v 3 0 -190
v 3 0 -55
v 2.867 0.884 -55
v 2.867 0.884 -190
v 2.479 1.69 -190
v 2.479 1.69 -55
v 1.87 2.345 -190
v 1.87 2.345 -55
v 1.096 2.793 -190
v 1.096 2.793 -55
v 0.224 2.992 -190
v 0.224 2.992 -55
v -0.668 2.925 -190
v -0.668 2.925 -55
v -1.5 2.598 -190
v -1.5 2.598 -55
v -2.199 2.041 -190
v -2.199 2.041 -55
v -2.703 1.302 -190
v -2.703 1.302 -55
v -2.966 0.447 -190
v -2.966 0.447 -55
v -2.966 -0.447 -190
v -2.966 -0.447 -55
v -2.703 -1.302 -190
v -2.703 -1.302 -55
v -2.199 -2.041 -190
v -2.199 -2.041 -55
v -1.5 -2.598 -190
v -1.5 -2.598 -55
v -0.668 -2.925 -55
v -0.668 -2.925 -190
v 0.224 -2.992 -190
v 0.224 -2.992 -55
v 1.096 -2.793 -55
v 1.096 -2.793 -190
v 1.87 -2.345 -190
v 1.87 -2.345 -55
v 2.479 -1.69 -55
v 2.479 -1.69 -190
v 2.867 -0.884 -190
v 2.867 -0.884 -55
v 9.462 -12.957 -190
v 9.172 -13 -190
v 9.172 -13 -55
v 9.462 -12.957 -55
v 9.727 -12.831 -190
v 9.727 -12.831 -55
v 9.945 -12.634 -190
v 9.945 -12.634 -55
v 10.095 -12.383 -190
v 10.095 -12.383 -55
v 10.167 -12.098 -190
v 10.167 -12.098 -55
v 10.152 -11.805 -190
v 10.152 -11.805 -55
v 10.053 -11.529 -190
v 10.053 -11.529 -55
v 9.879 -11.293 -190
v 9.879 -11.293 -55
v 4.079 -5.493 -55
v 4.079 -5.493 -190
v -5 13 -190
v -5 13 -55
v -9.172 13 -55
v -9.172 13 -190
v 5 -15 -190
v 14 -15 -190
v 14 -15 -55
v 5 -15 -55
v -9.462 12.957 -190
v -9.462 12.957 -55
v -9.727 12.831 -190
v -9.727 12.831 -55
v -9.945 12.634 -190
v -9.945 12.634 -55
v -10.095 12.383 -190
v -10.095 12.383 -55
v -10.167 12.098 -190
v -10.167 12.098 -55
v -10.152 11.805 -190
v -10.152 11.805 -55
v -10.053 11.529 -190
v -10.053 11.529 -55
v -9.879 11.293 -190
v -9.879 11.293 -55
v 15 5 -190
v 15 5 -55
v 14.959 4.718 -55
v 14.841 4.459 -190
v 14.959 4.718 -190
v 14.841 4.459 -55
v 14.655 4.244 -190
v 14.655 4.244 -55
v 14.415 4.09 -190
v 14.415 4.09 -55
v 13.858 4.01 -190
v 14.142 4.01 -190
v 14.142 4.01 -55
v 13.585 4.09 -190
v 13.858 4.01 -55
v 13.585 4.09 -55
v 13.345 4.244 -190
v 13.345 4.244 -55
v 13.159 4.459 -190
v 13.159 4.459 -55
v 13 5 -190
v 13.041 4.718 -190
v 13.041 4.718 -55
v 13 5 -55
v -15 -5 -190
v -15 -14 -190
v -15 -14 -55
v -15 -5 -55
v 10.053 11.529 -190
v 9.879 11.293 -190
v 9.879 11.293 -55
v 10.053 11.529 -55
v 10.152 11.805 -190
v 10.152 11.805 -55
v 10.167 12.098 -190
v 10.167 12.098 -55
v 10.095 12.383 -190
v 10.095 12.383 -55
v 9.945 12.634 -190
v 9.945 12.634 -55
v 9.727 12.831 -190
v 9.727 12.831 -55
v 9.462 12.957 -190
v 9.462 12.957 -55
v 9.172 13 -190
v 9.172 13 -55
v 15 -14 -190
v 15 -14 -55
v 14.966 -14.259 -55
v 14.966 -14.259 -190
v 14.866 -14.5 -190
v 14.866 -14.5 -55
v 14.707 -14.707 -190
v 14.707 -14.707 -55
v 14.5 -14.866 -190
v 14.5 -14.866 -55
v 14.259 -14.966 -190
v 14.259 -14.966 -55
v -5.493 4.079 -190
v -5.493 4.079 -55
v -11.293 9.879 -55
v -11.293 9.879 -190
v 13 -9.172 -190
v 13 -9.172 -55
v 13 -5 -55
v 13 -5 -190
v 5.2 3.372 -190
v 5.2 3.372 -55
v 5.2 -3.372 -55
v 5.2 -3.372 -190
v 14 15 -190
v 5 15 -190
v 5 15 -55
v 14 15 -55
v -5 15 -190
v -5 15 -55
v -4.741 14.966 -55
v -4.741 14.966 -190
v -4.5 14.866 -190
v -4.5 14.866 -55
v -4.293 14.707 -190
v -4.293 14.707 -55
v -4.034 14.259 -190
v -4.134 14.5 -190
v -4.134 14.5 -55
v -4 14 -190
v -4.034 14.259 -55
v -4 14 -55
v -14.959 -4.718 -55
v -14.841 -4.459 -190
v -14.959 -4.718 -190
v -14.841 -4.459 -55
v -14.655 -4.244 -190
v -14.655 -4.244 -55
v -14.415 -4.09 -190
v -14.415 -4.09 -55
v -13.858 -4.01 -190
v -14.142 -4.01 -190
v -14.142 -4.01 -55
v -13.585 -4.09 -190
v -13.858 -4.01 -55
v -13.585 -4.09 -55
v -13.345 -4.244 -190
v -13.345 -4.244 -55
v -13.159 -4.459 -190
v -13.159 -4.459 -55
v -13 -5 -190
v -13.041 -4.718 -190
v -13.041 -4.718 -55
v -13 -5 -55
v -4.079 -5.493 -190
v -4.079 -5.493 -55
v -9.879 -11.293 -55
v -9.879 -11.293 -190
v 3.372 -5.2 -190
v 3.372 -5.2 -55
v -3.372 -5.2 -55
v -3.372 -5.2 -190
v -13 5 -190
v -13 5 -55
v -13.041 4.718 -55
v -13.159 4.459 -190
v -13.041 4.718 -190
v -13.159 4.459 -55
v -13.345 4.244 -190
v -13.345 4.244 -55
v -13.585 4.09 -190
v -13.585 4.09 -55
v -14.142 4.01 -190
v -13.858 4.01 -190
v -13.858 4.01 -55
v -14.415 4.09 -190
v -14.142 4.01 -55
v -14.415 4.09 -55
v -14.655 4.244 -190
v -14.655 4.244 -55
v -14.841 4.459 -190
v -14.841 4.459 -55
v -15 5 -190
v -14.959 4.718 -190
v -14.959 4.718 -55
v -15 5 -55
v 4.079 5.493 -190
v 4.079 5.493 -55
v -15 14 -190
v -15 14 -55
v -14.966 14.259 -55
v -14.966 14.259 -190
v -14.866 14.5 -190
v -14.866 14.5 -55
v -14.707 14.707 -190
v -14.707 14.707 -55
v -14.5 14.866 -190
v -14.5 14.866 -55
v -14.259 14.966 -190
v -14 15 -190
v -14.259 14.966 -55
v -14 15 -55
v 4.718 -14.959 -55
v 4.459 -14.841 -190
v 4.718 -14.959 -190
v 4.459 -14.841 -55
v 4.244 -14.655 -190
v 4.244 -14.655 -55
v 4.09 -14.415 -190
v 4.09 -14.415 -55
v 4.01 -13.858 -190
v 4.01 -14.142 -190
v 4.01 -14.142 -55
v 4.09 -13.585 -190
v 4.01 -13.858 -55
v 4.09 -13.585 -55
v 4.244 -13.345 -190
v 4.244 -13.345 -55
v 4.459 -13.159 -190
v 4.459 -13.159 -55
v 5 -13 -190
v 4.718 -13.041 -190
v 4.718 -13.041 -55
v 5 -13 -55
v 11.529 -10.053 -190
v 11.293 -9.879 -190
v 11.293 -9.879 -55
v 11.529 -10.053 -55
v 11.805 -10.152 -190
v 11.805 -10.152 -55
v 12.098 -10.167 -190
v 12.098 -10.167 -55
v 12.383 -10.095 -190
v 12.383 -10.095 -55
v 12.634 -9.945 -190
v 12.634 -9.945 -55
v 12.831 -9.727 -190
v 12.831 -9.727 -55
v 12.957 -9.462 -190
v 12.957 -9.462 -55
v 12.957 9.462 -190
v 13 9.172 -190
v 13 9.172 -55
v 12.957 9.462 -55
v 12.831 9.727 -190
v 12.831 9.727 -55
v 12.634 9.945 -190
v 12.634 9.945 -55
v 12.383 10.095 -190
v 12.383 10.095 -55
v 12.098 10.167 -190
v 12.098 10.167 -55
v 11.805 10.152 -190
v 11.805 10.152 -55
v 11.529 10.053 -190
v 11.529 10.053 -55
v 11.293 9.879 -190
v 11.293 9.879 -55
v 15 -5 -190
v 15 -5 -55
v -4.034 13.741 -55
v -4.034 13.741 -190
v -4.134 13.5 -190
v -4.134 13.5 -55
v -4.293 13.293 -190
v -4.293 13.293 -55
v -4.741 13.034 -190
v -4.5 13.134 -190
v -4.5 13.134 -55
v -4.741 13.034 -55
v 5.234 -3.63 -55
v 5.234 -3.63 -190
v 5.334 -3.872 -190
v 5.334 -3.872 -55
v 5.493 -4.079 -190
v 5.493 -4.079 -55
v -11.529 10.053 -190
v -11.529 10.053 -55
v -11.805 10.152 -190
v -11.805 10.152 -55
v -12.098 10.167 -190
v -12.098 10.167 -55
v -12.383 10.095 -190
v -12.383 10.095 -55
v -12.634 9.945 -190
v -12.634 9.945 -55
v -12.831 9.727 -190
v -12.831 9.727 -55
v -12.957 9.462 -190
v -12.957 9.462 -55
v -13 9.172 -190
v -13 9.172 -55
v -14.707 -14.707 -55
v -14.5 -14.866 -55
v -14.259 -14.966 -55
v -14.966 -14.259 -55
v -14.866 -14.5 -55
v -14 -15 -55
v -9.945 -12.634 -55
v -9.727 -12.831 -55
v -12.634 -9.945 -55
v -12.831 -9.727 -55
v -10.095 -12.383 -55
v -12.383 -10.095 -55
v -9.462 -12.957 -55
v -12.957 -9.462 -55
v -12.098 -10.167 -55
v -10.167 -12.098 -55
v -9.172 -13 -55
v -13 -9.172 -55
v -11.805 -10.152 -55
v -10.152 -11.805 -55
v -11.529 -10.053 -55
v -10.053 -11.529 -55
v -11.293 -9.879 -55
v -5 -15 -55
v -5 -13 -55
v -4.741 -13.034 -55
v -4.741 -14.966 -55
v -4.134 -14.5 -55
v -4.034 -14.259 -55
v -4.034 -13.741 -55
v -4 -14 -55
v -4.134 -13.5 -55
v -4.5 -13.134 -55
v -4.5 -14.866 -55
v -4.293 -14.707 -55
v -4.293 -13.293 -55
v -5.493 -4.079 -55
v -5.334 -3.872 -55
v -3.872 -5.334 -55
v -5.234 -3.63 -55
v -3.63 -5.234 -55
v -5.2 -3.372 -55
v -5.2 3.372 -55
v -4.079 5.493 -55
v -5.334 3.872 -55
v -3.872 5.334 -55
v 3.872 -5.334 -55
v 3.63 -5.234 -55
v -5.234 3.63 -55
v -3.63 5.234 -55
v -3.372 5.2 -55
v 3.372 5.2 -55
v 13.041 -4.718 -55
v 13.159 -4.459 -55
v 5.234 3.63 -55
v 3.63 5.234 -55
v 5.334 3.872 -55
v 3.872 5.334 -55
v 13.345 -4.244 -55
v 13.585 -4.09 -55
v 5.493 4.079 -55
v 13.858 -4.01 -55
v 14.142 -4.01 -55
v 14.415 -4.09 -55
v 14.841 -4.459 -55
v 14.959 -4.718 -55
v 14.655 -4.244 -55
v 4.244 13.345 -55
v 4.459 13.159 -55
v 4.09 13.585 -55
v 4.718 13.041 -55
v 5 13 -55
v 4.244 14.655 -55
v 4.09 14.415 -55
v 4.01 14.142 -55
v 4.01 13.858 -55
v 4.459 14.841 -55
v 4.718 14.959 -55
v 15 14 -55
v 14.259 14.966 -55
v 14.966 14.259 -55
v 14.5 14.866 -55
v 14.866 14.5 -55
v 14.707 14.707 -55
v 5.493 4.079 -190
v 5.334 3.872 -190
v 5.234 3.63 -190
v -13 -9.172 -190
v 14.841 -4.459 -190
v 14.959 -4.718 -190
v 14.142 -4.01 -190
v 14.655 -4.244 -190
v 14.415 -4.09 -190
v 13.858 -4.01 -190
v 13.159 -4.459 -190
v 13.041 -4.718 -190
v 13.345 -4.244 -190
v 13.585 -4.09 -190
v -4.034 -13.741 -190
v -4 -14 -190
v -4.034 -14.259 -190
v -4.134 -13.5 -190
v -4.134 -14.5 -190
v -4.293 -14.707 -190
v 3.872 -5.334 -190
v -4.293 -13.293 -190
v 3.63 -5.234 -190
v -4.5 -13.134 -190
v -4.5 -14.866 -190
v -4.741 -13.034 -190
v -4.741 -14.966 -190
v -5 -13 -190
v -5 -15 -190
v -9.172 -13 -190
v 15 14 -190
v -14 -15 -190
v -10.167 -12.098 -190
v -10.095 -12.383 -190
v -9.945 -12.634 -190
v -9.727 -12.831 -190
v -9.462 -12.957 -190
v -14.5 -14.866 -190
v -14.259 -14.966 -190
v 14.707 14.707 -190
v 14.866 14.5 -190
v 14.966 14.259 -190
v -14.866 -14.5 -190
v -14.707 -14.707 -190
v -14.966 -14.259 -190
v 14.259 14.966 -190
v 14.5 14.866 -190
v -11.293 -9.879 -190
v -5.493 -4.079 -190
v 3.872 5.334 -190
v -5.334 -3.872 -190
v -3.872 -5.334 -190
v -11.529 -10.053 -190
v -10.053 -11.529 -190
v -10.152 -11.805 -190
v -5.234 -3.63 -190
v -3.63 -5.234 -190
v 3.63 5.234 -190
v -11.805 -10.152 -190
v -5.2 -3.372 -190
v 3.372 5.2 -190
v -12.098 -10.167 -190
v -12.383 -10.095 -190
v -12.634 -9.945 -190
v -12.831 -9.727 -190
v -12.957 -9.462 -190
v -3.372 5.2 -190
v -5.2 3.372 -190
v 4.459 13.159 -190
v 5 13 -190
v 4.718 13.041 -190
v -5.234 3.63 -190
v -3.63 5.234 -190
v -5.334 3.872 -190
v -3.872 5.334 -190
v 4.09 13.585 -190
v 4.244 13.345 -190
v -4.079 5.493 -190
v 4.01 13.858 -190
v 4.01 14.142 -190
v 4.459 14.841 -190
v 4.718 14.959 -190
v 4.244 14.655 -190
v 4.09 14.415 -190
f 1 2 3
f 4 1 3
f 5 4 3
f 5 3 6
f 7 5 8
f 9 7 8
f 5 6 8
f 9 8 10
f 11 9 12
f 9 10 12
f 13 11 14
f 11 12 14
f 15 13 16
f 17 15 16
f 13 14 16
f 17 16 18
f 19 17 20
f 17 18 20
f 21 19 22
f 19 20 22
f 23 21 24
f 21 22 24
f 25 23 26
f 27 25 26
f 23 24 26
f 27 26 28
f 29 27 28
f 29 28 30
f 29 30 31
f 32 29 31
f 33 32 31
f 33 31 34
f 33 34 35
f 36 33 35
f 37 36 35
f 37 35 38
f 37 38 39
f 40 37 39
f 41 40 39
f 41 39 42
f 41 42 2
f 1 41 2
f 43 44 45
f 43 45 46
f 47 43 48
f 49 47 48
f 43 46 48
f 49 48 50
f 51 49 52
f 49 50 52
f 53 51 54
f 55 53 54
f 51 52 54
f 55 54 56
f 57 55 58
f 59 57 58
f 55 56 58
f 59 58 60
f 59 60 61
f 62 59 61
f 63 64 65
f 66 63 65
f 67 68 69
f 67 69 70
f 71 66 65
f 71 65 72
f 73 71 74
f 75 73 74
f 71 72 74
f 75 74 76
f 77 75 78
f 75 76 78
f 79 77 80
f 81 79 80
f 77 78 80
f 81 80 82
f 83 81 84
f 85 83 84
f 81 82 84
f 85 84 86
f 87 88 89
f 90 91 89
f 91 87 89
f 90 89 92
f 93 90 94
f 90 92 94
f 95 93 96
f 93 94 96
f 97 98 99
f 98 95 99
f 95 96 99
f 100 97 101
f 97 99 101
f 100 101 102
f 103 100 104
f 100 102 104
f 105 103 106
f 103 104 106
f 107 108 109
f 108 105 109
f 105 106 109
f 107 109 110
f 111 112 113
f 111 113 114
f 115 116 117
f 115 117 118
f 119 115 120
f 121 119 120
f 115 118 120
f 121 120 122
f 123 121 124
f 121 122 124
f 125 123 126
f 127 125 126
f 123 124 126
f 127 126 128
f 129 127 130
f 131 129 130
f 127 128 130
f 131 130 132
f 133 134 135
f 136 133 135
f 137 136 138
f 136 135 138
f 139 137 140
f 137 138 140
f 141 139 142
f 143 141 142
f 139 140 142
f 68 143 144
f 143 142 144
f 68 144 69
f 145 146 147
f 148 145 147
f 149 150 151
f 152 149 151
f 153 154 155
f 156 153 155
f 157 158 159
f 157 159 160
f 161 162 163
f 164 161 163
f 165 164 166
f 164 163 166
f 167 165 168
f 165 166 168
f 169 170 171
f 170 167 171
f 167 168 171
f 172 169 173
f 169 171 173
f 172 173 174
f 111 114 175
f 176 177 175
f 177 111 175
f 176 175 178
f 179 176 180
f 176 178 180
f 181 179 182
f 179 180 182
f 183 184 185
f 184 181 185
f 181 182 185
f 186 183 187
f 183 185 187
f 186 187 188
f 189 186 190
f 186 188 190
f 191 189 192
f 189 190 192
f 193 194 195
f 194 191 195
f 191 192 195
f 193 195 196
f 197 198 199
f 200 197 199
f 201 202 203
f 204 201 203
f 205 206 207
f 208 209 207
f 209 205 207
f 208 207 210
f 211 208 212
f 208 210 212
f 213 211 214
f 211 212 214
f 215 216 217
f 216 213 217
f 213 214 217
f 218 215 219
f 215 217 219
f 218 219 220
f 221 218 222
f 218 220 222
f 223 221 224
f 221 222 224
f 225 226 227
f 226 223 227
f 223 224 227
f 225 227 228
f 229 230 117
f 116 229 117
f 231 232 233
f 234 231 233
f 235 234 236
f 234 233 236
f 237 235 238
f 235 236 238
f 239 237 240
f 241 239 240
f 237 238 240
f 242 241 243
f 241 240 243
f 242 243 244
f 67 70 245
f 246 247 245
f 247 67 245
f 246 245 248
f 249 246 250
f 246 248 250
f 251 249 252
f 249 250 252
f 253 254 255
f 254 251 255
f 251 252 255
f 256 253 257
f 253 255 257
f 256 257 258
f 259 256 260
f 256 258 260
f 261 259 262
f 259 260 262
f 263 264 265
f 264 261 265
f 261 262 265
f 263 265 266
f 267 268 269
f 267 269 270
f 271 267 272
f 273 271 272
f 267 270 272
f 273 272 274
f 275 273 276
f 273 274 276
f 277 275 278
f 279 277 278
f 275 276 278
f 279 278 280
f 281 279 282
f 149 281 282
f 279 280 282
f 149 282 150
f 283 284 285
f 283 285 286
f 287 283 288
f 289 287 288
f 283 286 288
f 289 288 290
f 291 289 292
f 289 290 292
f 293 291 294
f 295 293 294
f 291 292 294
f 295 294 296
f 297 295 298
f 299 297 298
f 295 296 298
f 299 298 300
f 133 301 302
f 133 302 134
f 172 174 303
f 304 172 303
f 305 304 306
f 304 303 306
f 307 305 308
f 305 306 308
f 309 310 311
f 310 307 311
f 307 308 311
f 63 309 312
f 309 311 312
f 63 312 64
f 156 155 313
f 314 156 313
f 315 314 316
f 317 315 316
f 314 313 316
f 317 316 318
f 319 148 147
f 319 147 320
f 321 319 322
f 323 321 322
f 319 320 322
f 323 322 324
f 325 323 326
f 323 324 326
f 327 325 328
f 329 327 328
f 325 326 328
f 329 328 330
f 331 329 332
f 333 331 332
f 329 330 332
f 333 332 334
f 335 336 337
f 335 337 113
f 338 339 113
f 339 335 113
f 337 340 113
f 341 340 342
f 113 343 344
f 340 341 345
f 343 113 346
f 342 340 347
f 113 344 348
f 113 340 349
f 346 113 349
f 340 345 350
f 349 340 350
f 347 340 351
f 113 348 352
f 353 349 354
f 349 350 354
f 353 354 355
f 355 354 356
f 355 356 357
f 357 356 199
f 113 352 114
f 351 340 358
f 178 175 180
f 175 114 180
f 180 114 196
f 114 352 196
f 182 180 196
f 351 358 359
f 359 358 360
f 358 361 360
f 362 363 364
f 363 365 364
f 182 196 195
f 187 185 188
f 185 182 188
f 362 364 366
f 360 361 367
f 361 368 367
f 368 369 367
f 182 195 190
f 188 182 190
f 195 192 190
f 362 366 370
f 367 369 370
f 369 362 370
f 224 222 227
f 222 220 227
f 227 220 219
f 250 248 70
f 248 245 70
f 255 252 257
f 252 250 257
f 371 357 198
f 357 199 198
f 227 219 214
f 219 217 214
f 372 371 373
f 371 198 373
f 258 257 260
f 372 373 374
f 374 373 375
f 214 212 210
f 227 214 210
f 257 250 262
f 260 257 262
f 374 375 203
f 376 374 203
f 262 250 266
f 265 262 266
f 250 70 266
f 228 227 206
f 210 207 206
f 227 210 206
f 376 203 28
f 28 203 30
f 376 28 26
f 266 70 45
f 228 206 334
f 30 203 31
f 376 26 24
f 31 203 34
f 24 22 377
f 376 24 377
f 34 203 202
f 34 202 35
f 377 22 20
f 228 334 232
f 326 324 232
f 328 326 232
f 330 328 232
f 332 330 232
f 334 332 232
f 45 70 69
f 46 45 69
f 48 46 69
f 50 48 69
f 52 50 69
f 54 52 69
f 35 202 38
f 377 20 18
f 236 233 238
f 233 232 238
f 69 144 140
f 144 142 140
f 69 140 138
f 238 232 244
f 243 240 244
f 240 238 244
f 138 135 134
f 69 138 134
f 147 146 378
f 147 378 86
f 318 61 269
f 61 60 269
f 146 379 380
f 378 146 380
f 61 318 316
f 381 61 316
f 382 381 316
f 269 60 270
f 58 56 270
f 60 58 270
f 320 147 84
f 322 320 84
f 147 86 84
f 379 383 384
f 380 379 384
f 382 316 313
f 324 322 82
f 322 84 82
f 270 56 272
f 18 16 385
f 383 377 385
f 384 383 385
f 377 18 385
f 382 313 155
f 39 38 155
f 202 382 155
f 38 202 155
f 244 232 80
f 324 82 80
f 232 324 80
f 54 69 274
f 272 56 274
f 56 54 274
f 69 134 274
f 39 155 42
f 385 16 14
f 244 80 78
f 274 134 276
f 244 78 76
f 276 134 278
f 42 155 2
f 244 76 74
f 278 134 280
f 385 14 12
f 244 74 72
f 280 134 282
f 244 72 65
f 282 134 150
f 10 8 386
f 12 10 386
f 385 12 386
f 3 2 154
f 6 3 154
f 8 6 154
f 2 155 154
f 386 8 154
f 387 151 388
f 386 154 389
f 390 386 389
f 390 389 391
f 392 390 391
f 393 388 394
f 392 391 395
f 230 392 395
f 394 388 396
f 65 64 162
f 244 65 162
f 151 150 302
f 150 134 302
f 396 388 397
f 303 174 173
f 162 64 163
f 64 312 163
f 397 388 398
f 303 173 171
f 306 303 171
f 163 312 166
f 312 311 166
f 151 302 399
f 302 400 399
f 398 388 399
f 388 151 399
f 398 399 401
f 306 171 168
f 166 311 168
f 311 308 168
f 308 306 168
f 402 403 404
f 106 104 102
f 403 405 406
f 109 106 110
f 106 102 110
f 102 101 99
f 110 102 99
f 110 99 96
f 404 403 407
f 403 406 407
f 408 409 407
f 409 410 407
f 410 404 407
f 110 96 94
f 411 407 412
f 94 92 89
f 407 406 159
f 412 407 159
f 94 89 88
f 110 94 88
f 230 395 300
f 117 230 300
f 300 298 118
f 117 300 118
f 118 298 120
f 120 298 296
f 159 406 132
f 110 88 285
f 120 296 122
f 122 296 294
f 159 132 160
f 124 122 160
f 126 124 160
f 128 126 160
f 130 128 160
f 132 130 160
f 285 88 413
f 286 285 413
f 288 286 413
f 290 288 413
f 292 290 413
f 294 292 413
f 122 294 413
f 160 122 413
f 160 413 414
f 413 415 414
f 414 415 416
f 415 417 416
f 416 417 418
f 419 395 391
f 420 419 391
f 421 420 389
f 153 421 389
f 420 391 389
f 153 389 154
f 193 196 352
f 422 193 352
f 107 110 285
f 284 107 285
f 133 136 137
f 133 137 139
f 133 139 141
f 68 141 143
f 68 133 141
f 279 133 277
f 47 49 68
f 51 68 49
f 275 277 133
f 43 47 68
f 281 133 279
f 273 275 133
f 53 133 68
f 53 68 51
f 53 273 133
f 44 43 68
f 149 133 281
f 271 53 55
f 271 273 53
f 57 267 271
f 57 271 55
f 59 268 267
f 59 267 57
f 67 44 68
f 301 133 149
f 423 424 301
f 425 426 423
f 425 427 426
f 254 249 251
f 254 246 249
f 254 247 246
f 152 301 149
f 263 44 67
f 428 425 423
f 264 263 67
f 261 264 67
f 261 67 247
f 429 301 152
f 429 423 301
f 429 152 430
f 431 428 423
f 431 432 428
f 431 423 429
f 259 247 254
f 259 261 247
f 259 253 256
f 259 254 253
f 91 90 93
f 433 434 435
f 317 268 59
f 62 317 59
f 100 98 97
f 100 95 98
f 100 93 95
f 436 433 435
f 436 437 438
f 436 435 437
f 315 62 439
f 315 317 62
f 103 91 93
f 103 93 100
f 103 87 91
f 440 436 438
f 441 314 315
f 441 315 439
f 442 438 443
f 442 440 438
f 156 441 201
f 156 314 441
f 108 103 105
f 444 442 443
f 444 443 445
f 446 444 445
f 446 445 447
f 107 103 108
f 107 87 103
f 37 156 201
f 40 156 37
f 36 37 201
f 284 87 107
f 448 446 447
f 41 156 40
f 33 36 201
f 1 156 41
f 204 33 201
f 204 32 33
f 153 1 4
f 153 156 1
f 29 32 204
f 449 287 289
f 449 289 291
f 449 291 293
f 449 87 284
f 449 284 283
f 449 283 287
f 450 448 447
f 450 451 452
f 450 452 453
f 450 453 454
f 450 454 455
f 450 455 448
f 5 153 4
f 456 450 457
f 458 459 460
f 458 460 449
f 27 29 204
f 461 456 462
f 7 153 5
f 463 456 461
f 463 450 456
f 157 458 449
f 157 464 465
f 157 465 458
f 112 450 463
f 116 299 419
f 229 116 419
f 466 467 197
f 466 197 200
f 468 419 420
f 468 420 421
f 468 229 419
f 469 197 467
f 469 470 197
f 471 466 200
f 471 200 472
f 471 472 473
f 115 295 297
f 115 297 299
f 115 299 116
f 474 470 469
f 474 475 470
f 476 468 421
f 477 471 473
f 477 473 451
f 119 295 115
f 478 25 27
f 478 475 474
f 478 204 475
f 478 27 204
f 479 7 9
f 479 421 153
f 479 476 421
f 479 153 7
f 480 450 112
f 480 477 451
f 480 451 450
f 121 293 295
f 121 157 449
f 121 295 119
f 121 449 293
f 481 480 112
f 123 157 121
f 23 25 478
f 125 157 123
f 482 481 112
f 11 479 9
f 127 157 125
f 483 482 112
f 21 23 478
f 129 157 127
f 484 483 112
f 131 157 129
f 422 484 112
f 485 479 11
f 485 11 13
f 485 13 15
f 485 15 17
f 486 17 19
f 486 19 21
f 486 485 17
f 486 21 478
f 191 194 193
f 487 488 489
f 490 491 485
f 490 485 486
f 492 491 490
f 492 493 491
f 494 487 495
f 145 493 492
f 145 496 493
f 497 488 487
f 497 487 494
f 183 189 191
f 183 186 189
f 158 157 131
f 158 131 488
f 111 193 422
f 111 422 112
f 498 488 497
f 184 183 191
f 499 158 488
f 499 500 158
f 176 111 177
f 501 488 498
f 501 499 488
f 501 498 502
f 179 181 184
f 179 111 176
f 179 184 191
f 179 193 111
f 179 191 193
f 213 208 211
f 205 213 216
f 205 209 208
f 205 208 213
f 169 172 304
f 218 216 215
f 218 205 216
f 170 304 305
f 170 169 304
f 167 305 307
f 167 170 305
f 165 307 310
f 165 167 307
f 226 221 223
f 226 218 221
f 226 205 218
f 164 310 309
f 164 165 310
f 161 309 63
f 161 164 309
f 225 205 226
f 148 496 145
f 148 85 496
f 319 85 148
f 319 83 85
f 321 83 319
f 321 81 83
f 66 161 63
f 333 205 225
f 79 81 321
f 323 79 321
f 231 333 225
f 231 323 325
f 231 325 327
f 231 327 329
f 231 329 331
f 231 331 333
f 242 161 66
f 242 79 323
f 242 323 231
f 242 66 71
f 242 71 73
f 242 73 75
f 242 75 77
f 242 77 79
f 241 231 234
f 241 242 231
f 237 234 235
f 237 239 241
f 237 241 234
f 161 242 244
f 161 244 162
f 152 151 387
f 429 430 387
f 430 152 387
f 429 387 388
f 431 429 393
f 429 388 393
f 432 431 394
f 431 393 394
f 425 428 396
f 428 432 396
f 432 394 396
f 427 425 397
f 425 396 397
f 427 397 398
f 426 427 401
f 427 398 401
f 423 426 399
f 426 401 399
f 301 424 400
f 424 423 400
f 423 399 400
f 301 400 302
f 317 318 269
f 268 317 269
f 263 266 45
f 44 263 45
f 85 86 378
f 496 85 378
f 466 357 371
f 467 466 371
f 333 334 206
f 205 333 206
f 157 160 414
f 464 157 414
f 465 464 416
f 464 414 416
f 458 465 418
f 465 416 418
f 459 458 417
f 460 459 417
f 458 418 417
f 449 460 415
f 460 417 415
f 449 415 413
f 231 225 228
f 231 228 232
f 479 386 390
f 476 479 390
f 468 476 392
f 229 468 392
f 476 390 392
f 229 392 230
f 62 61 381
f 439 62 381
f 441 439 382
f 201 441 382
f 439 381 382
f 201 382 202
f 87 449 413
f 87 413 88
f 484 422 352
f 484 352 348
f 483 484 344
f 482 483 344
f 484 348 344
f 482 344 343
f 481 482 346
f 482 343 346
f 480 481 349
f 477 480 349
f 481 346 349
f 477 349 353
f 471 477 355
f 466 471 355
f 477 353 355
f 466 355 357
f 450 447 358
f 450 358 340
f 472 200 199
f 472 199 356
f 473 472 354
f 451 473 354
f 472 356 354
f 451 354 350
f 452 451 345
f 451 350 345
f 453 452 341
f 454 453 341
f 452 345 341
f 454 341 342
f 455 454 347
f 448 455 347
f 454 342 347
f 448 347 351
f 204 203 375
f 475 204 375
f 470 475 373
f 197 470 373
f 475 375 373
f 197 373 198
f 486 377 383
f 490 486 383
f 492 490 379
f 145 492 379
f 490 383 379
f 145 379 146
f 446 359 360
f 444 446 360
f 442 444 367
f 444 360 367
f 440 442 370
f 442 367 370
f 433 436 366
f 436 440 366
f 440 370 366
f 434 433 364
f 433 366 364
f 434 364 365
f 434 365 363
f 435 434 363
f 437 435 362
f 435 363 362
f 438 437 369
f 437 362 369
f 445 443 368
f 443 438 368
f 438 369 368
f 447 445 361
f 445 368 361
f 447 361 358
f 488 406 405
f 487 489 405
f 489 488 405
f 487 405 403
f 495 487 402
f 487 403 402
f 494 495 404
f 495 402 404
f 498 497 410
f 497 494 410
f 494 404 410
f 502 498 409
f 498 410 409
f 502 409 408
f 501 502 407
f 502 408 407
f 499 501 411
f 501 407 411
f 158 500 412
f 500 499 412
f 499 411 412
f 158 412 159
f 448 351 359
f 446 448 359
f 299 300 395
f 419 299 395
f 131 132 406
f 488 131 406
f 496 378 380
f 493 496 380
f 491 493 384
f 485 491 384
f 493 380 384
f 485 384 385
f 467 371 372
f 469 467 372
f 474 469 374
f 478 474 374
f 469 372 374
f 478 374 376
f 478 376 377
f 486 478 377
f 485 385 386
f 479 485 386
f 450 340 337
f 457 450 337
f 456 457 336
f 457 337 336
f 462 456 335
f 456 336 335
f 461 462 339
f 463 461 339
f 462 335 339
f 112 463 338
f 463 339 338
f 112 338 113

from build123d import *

# Parameters (mm, degrees)
SALIENTE_EXTRUIR1_DEPTH = 190
CROQUIS2_R              = 3
CORTAR_EXTRUIR1_DEPTH   = 192.180542943
CORTAR_EXTRUIR3_DEPTH   = 192.180542943
CROQUIS4_W              = 33.127581221
CROQUIS4_H              = 30
CORTAR_EXTRUIR4_DEPTH   = 38
CROQUIS5_W              = 25
CROQUIS5_H              = 30
CORTAR_EXTRUIR5_DEPTH   = 30


with BuildPart() as part:
    # Croquis1 → Saliente-Extruir1 (new body)
    with BuildSketch(Plane.XY):
        with BuildLine():
            Line((-14, 15), (14, 15))
            ThreePointArc((14, 15), (14.707106781, 14.707106781), (15, 14))
            Line((15, 14), (15, -14))
            ThreePointArc((15, -14), (14.707106781, -14.707106781), (14, -15))
            Line((14, -15), (-14, -15))
            ThreePointArc((-14, -15), (-14.707106781, -14.707106781), (-15, -14))
            Line((-15, -14), (-15, 14))
            ThreePointArc((-15, 14), (-14.707106781, 14.707106781), (-14, 15))
        make_face()
    extrude(amount=-SALIENTE_EXTRUIR1_DEPTH)

    # Croquis2 → Cortar-Extruir1 (cut, through all)
    with BuildSketch(Plane.XY):
        Circle(CROQUIS2_R)
    extrude(amount=-CORTAR_EXTRUIR1_DEPTH, mode=Mode.SUBTRACT)

    # Croquis3 → Cortar-Extruir3 (cut, through all)
    with BuildSketch(Plane.XY):
        with BuildLine():
            Line((-5.492893219, 4.078679656), (-11.292893219, 9.878679656))
            ThreePointArc((-11.292893219, 9.878679656), (-12.382683432, 10.095452408), (-13, 9.171572875))
            Line((-13, 9.171572875), (-13, 5))
            ThreePointArc((-13, 5), (-14, 4), (-15, 5))
            Line((-15, 5), (-15, -5))
            ThreePointArc((-15, -5), (-14, -4), (-13, -5))
            Line((-13, -5), (-13, -9.171572875))
            ThreePointArc((-13, -9.171572875), (-12.382683432, -10.095452408), (-11.292893219, -9.878679656))
            Line((-11.292893219, -9.878679656), (-5.492893219, -4.078679656))
            ThreePointArc((-5.492893219, -4.078679656), (-5.276120467, -3.754256308), (-5.2, -3.371572875))
            Line((-5.2, -3.371572875), (-5.2, 3.371572875))
            ThreePointArc((-5.2, 3.371572875), (-5.276120467, 3.754256308), (-5.492893219, 4.078679656))
        make_face()
        with BuildLine():
            ThreePointArc((-9.171572875, 13), (-10.095452408, 12.382683432), (-9.878679656, 11.292893219))
            Line((-9.878679656, 11.292893219), (-4.078679656, 5.492893219))
            ThreePointArc((-4.078679656, 5.492893219), (-3.754256308, 5.276120467), (-3.371572875, 5.2))
            Line((-3.371572875, 5.2), (3.371572875, 5.2))
            ThreePointArc((3.371572875, 5.2), (3.754256308, 5.276120467), (4.078679656, 5.492893219))
            Line((4.078679656, 5.492893219), (9.878679656, 11.292893219))
            ThreePointArc((9.878679656, 11.292893219), (10.095452408, 12.382683432), (9.171572875, 13))
            Line((9.171572875, 13), (5, 13))
            ThreePointArc((5, 13), (4, 14), (5, 15))
            Line((5, 15), (-5, 15))
            ThreePointArc((-5, 15), (-4.292893219, 14.707106781), (-4, 14))
            ThreePointArc((-4, 14), (-4.292893219, 13.292893219), (-5, 13))
            Line((-5, 13), (-9.171572875, 13))
        make_face()
        with BuildLine():
            Line((9.878679656, -11.292893219), (4.078679656, -5.492893219))
            ThreePointArc((4.078679656, -5.492893219), (3.754256308, -5.276120467), (3.371572875, -5.2))
            Line((3.371572875, -5.2), (-3.371572875, -5.2))
            ThreePointArc((-3.371572875, -5.2), (-3.754256308, -5.276120467), (-4.078679656, -5.492893219))
            Line((-4.078679656, -5.492893219), (-9.878679656, -11.292893219))
            ThreePointArc((-9.878679656, -11.292893219), (-10.095452408, -12.382683432), (-9.171572875, -13))
            Line((-9.171572875, -13), (-5, -13))
            ThreePointArc((-5, -13), (-4.292893219, -13.292893219), (-4, -14))
            ThreePointArc((-4, -14), (-4.292893219, -14.707106781), (-5, -15))
            Line((-5, -15), (5, -15))
            ThreePointArc((5, -15), (4, -14), (5, -13))
            Line((5, -13), (9.171572875, -13))
            ThreePointArc((9.171572875, -13), (10.095452408, -12.382683432), (9.878679656, -11.292893219))
        make_face()
        with BuildLine():
            ThreePointArc((13, 9.171572875), (12.382683432, 10.095452408), (11.292893219, 9.878679656))
            Line((11.292893219, 9.878679656), (5.492893219, 4.078679656))
            ThreePointArc((5.492893219, 4.078679656), (5.276120467, 3.754256308), (5.2, 3.371572875))
            Line((5.2, 3.371572875), (5.2, -3.371572875))
            ThreePointArc((5.2, -3.371572875), (5.276120467, -3.754256308), (5.492893219, -4.078679656))
            Line((5.492893219, -4.078679656), (11.292893219, -9.878679656))
            ThreePointArc((11.292893219, -9.878679656), (12.382683432, -10.095452408), (13, -9.171572875))
            Line((13, -9.171572875), (13, -5))
            ThreePointArc((13, -5), (14, -4), (15, -5))
            Line((15, -5), (15, 5))
            ThreePointArc((15, 5), (14, 4), (13, 5))
            Line((13, 5), (13, 9.171572875))
        make_face()
    extrude(amount=-CORTAR_EXTRUIR3_DEPTH, mode=Mode.SUBTRACT)

    # Croquis4 → Cortar-Extruir4 (cut)
    with BuildSketch(Plane(origin=(0, 15, 0), x_dir=(1, 0, 0), z_dir=(0, 1, 0))):
        with Locations((-1.56379061, 15)):
            Rectangle(CROQUIS4_W, CROQUIS4_H)
    extrude(amount=-CORTAR_EXTRUIR4_DEPTH, mode=Mode.SUBTRACT)

    # Croquis5 → Cortar-Extruir5 (cut)
    with BuildSketch(Plane(origin=(15, 0, 0), x_dir=(0, 0, -1), z_dir=(1, 0, 0))):
        with Locations((42.5, 0)):
            Rectangle(CROQUIS5_W, CROQUIS5_H)
    extrude(amount=-CORTAR_EXTRUIR5_DEPTH, mode=Mode.SUBTRACT)


solid = part.part
